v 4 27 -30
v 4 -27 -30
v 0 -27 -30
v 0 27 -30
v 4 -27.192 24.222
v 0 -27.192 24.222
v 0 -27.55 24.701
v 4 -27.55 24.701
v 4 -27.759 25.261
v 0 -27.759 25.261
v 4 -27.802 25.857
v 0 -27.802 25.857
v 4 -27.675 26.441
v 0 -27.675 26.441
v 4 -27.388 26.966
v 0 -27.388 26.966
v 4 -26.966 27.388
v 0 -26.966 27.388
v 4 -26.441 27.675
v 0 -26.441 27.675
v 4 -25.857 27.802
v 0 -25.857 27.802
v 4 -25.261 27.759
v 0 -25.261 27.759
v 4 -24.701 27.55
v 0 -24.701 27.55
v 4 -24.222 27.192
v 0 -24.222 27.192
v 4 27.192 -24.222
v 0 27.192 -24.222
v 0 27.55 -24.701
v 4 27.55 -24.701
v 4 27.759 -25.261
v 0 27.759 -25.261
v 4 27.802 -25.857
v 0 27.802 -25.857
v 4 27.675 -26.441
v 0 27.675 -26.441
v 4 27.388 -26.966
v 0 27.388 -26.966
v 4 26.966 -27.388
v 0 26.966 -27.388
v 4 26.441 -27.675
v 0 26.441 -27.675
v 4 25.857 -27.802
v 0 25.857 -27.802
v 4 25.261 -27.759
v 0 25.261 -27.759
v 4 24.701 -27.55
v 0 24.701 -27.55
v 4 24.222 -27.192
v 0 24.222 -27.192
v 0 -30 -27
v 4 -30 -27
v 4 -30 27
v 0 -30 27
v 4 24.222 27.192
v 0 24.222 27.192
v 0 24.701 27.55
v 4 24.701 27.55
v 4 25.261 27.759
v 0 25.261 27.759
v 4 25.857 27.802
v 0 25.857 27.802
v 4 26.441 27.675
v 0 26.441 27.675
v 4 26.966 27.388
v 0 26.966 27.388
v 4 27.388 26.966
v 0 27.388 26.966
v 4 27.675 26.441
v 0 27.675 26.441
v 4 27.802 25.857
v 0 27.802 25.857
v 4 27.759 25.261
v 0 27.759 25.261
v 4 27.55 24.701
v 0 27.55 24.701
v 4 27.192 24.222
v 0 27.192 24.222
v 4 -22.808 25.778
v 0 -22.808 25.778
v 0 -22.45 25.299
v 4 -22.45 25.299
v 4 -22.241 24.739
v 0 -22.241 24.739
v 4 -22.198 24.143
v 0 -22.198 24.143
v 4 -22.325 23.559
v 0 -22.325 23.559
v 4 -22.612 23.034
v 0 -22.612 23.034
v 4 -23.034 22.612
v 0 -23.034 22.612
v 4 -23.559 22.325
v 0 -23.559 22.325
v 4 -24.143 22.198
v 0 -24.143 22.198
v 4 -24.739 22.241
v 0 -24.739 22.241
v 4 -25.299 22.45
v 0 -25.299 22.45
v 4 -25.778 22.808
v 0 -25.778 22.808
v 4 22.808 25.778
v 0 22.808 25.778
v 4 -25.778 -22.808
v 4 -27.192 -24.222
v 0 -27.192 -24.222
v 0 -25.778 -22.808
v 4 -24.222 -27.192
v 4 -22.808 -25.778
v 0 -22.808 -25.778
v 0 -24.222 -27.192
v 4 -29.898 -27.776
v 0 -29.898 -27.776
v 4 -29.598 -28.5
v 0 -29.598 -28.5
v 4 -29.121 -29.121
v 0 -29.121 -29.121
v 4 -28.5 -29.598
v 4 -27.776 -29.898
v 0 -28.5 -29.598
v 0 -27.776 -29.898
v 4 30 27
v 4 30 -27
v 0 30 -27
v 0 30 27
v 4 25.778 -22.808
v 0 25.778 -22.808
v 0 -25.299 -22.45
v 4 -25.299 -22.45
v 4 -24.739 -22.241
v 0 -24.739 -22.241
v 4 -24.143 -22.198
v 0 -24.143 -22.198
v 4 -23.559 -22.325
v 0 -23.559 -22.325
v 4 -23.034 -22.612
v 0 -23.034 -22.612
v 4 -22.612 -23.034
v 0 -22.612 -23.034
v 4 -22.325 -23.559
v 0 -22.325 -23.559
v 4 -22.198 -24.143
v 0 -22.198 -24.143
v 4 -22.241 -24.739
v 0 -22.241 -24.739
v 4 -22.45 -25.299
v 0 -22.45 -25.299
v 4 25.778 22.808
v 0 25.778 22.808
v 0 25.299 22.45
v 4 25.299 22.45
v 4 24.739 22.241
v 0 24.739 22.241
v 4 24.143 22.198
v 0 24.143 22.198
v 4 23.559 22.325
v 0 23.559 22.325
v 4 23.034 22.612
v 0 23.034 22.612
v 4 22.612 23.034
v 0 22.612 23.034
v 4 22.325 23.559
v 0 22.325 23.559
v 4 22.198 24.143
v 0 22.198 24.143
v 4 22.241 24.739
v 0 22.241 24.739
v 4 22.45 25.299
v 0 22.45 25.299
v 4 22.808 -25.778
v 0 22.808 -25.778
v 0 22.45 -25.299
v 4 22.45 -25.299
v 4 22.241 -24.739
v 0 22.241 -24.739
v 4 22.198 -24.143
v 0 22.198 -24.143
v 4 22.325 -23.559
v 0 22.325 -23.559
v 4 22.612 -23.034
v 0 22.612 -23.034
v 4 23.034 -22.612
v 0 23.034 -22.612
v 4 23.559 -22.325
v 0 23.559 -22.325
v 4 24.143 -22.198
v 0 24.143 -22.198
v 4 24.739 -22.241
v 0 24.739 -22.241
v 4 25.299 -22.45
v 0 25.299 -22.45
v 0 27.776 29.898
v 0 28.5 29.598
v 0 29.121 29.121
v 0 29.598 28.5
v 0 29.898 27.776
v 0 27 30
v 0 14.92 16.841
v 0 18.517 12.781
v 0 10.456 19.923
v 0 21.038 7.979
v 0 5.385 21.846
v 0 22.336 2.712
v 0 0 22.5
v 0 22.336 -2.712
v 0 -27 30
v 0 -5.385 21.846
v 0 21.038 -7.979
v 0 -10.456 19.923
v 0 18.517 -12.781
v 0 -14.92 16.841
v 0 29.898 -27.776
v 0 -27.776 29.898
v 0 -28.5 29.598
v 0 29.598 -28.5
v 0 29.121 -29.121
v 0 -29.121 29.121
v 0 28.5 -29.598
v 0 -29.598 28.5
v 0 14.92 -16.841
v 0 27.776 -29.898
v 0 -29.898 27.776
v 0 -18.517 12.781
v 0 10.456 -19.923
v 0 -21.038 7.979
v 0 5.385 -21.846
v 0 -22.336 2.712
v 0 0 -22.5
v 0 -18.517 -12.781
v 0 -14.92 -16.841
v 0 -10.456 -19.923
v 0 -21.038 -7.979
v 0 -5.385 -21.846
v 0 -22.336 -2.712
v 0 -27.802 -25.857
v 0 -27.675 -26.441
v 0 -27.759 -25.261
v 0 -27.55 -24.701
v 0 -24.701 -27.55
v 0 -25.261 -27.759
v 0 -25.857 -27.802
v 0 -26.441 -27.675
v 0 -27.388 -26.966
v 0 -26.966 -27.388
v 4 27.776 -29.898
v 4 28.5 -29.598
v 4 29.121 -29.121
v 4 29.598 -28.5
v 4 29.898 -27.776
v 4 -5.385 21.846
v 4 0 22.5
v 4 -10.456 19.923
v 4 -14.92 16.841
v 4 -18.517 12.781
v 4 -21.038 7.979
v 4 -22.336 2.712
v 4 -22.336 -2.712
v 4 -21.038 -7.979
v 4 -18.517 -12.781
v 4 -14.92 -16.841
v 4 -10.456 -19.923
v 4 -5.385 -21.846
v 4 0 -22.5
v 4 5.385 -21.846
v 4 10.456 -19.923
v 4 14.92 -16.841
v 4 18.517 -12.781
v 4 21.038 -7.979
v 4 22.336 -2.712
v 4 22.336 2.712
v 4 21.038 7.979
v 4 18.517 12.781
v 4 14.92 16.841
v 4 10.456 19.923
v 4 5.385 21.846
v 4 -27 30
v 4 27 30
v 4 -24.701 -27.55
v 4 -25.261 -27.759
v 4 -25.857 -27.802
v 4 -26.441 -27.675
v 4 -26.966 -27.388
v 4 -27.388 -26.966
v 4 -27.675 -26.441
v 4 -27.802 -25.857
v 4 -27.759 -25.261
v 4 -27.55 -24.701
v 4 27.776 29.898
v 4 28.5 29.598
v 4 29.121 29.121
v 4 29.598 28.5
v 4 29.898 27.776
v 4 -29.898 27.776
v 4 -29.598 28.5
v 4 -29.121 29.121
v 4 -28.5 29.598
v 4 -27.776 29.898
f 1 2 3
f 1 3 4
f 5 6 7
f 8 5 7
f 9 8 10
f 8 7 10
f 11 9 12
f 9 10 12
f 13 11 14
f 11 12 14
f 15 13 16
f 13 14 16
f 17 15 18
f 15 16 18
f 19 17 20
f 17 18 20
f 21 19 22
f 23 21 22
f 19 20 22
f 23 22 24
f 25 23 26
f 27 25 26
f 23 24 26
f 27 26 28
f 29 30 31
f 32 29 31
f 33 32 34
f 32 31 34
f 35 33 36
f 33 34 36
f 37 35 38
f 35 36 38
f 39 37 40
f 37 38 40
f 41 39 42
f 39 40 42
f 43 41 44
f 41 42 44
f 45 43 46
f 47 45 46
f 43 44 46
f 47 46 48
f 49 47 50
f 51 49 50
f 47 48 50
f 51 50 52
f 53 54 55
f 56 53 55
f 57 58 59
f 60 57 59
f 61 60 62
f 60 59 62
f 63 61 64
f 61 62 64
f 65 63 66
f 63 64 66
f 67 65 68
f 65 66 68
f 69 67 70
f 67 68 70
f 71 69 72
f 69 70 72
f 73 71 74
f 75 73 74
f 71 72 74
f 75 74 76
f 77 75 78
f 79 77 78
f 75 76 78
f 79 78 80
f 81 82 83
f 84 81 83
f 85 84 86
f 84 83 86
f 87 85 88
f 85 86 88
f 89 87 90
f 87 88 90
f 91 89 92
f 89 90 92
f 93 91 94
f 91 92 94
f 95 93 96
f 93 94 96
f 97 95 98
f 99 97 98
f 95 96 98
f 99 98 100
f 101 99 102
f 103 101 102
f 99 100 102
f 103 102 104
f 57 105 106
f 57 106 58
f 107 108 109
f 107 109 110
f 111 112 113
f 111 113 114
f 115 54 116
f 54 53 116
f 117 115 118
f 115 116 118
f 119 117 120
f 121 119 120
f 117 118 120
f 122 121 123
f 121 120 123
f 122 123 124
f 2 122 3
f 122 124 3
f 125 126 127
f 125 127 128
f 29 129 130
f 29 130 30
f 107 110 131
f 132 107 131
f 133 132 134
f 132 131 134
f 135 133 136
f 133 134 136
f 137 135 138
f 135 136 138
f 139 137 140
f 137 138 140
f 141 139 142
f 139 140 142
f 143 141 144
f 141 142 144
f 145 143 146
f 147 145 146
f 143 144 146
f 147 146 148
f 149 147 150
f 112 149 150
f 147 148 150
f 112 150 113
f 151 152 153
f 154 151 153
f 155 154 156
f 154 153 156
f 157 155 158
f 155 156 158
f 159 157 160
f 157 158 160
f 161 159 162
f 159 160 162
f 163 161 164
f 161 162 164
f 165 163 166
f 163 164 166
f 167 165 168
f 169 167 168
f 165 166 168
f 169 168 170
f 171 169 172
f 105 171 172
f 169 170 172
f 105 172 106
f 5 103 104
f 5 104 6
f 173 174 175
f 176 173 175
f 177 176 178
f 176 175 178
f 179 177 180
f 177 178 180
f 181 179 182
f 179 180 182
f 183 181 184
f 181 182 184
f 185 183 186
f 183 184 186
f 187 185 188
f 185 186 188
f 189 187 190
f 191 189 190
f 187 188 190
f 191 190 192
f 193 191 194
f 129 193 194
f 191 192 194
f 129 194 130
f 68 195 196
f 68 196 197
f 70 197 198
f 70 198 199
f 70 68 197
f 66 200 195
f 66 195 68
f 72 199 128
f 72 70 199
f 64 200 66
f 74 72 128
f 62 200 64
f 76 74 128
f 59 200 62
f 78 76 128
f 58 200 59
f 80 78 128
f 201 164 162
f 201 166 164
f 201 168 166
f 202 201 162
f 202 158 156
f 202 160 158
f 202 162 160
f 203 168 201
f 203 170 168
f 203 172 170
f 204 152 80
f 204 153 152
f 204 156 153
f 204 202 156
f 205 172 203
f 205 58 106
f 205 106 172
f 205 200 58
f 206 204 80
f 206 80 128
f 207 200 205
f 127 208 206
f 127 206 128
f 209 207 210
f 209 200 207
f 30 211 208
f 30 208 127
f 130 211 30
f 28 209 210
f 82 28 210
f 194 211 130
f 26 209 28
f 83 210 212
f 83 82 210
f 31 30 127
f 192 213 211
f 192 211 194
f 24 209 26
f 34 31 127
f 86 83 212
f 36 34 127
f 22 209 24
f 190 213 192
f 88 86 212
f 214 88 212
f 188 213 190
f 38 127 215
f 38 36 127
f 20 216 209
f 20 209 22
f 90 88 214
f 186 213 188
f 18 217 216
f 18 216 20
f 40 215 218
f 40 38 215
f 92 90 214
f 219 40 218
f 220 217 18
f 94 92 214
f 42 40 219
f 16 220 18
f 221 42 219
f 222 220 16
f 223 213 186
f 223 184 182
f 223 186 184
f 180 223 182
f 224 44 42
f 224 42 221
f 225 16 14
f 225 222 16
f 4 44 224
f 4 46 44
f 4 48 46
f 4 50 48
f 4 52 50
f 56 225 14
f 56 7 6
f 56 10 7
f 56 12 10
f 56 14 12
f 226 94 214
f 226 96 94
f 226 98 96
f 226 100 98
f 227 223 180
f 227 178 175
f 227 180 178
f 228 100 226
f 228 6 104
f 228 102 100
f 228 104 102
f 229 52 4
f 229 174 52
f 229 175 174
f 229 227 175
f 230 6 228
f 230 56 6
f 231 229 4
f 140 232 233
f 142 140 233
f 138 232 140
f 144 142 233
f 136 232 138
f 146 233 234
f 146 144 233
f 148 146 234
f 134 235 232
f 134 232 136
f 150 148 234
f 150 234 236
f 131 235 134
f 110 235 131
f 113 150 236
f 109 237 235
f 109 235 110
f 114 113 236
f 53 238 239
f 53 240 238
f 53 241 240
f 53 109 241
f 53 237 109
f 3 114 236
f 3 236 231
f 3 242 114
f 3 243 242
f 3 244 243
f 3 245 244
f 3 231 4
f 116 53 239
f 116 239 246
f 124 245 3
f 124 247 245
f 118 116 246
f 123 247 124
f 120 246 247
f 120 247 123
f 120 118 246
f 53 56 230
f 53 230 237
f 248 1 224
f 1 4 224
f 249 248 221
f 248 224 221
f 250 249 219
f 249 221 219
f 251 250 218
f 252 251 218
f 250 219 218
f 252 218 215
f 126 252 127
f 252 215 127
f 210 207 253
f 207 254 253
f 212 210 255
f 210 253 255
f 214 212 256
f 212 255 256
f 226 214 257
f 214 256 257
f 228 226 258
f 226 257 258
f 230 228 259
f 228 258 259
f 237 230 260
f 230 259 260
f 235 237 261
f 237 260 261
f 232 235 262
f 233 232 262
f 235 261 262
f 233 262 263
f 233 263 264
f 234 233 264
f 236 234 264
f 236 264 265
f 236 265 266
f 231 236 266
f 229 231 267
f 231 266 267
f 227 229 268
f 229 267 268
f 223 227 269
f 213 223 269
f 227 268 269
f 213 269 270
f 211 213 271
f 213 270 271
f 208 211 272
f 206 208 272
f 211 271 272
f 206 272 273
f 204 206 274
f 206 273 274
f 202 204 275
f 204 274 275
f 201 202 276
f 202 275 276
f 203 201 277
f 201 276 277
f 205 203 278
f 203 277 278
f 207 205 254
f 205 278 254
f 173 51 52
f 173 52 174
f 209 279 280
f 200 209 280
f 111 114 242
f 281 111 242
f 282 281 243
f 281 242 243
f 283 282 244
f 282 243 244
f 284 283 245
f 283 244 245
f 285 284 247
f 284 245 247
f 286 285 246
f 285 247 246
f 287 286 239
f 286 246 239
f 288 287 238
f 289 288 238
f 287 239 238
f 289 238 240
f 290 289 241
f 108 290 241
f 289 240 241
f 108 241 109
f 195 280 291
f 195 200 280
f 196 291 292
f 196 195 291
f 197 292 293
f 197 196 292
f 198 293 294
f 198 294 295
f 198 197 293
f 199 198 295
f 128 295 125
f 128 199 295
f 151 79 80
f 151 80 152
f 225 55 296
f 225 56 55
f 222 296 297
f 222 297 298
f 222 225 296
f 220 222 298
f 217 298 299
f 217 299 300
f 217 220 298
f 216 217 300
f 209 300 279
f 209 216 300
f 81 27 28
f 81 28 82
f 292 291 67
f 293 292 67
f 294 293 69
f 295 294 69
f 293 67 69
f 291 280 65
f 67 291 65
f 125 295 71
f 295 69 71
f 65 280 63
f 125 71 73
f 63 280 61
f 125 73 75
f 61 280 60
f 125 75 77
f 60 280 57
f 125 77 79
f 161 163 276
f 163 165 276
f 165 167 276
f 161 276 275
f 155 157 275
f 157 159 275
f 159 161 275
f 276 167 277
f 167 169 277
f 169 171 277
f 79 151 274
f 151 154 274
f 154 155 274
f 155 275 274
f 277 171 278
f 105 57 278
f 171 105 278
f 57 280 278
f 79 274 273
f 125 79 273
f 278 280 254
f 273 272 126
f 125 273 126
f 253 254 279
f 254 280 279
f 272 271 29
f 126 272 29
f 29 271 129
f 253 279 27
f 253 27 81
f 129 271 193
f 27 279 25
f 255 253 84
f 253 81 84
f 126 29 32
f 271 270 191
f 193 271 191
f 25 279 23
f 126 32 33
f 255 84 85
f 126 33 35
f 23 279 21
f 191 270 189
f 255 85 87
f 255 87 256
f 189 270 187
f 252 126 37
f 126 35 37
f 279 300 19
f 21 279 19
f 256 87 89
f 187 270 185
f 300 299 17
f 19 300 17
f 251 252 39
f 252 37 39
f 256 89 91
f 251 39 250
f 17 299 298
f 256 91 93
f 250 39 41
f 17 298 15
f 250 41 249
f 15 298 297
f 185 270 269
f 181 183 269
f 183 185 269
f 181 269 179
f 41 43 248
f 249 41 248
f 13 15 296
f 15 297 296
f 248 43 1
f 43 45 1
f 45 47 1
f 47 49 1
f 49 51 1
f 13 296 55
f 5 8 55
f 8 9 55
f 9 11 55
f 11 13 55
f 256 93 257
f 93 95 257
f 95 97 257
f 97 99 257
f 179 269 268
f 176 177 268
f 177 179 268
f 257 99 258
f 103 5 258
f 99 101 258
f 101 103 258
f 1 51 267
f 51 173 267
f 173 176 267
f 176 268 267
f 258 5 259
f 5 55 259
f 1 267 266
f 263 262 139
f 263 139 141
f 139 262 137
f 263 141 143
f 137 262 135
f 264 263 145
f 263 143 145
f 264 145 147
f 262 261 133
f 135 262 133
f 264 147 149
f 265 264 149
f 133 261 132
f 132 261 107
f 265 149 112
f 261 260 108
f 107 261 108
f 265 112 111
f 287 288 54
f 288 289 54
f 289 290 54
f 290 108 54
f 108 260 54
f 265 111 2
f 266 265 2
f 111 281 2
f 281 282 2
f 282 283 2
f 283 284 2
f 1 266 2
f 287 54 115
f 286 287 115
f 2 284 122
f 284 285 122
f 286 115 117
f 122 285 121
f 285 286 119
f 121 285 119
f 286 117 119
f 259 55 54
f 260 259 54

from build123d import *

# Parameters (mm, degrees)
SKETCH_1_W               = 4
SKETCH_1_H               = 27.5
CUT_EXTRUDE_4_DEPTH      = 71.823724839
CUT_EXTRUDE_4_DEPTH_BACK = 71.823724839
SKETCH_7_R               = 50
SKETCH_7_W               = 60
SKETCH_7_H               = 60
CUT_EXTRUDE_3_DEPTH      = 43.614551505
PATTERN_CIRCULAR_2_COUNT = 4
FILLET_1_R               = 3


with BuildPart() as part:
    # Эскиз1 → Повернуть1 (revolve)
    with BuildSketch(Plane.XY, mode=Mode.PRIVATE) as revolve_1_sk:
        with Locations((2, 36.25)):
            Rectangle(SKETCH_1_W, SKETCH_1_H)
    revolve(revolve_1_sk.sketch.rotate(Axis((-29.36512031, 0, 0), (1, 0, 0)), 90), axis=Axis((-29.36512031, 0, 0), (1, 0, 0)))

    # Эскиз7 → Вырез-Вытянуть4 (cut, two sides: drawn at the far end of the back side and taken through both)
    with BuildSketch(Plane.ZY.offset(-CUT_EXTRUDE_4_DEPTH_BACK)):
        Circle(SKETCH_7_R)
        Rectangle(SKETCH_7_W, SKETCH_7_H, mode=Mode.SUBTRACT)
    extrude(amount=CUT_EXTRUDE_4_DEPTH + CUT_EXTRUDE_4_DEPTH_BACK, mode=Mode.SUBTRACT)

    # Эскиз6 → Вырез-Вытянуть3 (cut, symmetric)
    with BuildSketch(Plane.ZY):
        with BuildLine():
            Line((-27.192031022, 24.222182541), (-25.777817459, 22.807968978))
            ThreePointArc((-25.777817459, 22.807968978), (-22.807968978, 22.807968978), (-22.807968978, 25.777817459))
            Line((-22.807968978, 25.777817459), (-24.222182541, 27.192031022))
            ThreePointArc((-24.222182541, 27.192031022), (-27.192031022, 27.192031022), (-27.192031022, 24.222182541))
        make_face()
    cut_extrude_3 = extrude(amount=CUT_EXTRUDE_3_DEPTH, both=True, mode=Mode.SUBTRACT)

    # Круговой массив2: Вырез-Вытянуть3 ×4 about axis
    pattern_circular_2_axis = Axis((0, 0, 0), (1, 0, 0))
    for i in range(1, PATTERN_CIRCULAR_2_COUNT):
        add(cut_extrude_3.rotate(pattern_circular_2_axis, i * 360 / PATTERN_CIRCULAR_2_COUNT), mode=Mode.SUBTRACT)

    # Скругление1
    fillet_1_edges = [part.edges().sort_by_distance(p)[0] for p in [
        (2, 30, -30),
        (2, 30, 30),
        (2, -30, 30),
        (2, -30, -30),
    ]]
    fillet(fillet_1_edges, radius=FILLET_1_R)


solid = part.part
